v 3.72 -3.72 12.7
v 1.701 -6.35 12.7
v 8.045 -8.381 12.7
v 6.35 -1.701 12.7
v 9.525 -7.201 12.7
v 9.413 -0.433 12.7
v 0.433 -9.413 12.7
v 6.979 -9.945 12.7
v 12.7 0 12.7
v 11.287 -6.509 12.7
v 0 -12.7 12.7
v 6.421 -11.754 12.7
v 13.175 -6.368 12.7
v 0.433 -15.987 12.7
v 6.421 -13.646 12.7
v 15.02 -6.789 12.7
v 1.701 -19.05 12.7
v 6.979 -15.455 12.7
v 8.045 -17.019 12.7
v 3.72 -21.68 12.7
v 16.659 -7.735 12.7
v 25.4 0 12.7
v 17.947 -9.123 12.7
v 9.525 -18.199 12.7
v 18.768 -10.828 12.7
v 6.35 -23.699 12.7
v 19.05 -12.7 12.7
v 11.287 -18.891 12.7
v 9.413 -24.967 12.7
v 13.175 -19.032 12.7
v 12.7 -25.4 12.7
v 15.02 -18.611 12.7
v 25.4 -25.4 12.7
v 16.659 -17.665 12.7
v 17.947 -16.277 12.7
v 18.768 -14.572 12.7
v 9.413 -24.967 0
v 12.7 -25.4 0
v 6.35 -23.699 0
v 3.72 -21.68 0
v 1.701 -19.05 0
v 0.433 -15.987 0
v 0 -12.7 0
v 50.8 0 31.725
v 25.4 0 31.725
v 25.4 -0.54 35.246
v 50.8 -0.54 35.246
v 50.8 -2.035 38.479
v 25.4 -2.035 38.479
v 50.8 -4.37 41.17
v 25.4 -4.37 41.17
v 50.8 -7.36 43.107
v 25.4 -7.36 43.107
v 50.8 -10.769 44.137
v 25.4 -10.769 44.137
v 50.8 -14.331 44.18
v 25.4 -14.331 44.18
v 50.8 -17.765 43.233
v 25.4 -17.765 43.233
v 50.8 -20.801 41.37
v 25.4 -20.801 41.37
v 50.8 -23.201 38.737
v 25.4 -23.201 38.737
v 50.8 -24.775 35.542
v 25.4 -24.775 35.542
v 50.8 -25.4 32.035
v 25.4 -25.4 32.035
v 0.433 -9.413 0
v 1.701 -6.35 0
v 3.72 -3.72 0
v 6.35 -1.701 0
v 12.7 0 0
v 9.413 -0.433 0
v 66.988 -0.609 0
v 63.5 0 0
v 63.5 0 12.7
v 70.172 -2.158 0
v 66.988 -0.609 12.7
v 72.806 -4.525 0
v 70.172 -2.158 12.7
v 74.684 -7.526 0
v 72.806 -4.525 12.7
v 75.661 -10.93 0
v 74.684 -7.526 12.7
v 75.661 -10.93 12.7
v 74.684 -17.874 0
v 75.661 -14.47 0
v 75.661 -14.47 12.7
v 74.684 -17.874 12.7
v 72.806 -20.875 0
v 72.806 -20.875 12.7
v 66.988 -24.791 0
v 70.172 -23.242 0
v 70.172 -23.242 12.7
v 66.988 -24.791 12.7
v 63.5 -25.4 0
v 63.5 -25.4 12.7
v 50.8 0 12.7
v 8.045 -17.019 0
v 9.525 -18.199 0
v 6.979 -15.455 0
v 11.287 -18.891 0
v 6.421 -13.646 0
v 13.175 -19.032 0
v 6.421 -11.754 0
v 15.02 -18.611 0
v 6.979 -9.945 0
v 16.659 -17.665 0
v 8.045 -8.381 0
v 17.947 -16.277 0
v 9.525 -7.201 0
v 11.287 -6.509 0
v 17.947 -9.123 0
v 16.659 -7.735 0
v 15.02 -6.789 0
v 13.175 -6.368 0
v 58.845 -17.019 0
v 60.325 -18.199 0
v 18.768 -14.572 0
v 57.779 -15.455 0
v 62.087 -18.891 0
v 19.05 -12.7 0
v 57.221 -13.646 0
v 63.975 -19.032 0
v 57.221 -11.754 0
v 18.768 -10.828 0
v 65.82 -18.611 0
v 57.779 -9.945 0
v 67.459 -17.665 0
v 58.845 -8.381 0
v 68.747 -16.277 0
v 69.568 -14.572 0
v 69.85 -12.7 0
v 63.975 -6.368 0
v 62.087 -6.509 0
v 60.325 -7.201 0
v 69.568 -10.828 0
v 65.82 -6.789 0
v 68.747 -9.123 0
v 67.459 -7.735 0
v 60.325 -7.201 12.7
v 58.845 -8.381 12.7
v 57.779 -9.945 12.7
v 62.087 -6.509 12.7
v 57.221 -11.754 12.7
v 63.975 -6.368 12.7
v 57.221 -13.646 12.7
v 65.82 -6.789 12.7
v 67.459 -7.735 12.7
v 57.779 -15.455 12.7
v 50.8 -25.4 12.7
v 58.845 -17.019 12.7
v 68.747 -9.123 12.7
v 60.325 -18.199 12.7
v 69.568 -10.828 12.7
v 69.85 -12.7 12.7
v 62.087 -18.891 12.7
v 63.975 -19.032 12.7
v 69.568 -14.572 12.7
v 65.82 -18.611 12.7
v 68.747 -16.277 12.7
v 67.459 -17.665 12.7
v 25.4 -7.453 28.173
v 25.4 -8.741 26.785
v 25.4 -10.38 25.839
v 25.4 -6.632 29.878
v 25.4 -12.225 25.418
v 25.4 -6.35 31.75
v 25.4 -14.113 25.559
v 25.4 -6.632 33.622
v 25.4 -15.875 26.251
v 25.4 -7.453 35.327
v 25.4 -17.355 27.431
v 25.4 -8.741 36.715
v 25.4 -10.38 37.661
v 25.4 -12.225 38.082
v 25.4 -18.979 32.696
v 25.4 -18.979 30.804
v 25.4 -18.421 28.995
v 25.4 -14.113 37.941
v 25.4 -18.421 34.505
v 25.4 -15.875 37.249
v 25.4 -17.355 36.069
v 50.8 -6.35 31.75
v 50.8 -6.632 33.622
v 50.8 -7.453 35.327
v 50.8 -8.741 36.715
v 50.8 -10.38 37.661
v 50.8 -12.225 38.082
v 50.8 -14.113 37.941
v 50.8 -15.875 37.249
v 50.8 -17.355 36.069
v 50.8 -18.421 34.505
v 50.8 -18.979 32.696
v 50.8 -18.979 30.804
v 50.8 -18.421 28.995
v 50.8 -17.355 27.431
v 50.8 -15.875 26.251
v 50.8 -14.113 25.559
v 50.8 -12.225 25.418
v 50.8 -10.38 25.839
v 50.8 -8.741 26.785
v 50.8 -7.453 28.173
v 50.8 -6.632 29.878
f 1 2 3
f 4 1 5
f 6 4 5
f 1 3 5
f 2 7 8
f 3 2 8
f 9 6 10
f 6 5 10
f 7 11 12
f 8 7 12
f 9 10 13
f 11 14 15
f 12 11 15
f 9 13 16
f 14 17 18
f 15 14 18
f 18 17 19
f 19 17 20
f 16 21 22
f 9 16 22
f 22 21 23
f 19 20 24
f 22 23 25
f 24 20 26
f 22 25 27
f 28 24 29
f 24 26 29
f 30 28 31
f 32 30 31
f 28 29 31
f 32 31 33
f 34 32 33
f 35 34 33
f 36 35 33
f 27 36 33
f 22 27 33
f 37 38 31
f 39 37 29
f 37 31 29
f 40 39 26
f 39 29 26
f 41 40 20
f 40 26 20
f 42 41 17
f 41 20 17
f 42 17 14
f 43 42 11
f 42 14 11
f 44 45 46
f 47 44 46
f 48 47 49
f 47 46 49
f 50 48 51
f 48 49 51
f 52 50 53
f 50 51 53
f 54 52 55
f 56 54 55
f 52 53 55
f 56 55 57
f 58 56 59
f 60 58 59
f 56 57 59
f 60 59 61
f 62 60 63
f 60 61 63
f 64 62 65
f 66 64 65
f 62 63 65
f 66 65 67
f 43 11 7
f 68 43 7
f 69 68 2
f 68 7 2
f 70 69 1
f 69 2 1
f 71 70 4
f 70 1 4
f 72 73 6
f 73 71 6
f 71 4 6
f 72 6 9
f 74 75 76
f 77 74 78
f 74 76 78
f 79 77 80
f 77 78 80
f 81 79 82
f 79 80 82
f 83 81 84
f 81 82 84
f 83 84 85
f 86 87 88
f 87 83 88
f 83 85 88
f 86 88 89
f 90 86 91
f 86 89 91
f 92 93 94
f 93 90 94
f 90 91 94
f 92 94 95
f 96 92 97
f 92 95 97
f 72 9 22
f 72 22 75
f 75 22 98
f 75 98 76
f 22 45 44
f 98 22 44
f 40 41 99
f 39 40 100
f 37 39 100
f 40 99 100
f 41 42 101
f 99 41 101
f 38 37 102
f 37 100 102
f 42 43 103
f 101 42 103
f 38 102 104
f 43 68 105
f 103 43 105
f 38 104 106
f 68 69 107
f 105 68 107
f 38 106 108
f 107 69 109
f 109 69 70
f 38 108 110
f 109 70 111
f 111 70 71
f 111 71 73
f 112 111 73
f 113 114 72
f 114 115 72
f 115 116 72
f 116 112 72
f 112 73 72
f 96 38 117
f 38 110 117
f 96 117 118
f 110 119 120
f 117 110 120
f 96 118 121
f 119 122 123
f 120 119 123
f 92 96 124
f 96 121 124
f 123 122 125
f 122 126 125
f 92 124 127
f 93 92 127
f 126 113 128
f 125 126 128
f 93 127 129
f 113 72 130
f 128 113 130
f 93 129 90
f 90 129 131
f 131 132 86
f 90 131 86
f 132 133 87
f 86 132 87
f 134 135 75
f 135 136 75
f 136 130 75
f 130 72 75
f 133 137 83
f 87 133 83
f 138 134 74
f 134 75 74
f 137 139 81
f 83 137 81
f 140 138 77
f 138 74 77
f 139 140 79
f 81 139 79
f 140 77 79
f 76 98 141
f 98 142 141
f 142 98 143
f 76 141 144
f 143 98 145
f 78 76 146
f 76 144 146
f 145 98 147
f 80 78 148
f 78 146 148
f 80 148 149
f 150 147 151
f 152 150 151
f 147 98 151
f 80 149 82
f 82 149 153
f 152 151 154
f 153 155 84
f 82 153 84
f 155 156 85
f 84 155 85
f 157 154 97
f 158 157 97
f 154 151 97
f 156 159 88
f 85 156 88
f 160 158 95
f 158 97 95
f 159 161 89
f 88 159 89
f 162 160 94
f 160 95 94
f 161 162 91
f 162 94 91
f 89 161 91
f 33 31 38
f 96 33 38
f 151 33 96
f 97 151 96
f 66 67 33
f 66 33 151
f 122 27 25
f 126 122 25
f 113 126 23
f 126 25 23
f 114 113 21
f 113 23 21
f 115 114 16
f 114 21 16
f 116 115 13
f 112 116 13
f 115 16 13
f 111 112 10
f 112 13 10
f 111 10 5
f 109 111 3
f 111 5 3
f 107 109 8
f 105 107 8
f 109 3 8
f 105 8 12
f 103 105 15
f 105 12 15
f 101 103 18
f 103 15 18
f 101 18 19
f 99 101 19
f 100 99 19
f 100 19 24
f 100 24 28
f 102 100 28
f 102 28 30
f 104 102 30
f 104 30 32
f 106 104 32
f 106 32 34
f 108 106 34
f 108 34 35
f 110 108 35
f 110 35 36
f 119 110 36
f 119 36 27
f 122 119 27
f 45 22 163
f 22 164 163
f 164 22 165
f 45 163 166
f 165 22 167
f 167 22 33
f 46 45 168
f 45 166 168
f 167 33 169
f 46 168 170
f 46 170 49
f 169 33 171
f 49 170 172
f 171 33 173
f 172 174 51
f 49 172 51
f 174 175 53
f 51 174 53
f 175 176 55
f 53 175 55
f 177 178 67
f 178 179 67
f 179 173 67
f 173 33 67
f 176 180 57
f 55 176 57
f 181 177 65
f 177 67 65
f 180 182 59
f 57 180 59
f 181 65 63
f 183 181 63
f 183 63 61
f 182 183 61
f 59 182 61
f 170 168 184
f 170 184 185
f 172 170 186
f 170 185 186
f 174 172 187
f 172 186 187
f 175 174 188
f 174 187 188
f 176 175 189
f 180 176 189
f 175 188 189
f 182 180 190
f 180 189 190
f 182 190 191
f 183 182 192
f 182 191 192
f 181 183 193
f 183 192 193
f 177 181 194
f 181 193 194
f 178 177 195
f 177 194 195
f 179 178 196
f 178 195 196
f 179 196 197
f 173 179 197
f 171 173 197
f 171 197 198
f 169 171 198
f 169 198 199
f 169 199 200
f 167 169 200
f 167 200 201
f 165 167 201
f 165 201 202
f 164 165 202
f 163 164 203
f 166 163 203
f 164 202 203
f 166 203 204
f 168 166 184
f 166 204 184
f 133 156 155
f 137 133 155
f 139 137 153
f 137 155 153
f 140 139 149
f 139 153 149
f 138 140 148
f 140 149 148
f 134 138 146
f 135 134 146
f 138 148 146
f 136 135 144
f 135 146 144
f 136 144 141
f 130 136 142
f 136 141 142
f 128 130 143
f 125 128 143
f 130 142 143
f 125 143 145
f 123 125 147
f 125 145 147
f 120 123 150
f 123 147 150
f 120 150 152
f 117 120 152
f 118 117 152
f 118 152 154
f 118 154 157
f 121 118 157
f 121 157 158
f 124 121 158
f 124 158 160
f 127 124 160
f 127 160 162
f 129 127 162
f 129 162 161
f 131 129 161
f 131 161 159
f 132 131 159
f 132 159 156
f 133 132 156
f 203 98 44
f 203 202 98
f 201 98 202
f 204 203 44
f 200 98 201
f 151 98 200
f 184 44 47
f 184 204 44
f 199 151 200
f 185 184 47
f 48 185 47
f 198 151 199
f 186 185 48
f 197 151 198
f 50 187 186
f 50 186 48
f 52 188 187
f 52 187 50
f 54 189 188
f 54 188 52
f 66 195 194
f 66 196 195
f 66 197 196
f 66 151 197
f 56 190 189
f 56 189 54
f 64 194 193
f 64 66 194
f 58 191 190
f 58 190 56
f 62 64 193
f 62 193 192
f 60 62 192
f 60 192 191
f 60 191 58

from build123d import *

# Parameters (mm, degrees)
F0_W      = 76.2
F0_H      = 44.45
F1_DEPTH  = 25.4
F2_W      = 25.4
F2_H      = 31.75
F3_DEPTH  = 25.4
F4_R      = 6.35
F5_DEPTH  = 25.4
F6_R      = 6.35
F7_DEPTH  = 25.4
F9_DEPTH  = 25.4
F11_DEPTH = 25.4
F13_DEPTH = 25.4


with BuildPart() as f1:
    # F0 (on Front) → F1 (new body)
    with BuildSketch(Plane.XZ):
        with Locations((38.1, 22.225)):
            Rectangle(F0_W, F0_H)
    extrude(amount=F1_DEPTH)

    # F2 (on face) → F3 (cut)
    with BuildSketch(Plane.XZ.offset(25.4)):
        with Locations((12.7, 28.575)):
            Rectangle(F2_W, F2_H)
        with Locations((63.5, 28.575)):
            Rectangle(F2_W, F2_H)
    extrude(amount=-F3_DEPTH, mode=Mode.SUBTRACT)

    # F4 (on face) → F5 (cut)
    with BuildSketch(Plane.YZ.offset(50.8)):
        with Locations((-12.7, 31.75)):
            Circle(F4_R)
    extrude(amount=-F5_DEPTH, mode=Mode.SUBTRACT)

    # F6 (on face) → F7 (cut)
    with BuildSketch(Plane.XY.offset(12.7)):
        with Locations((12.7, -12.7)):
            Circle(F6_R)
        with Locations((63.5, -12.7)):
            Circle(F6_R)
    extrude(amount=-F7_DEPTH, mode=Mode.SUBTRACT)

    # F8 (on face) → F9 (cut)
    with BuildSketch(Plane.XY.offset(12.7)):
        with BuildLine():
            ThreePointArc((0, -12.7), (3.7197438789, -3.7197438789), (12.7, 0))
            Line((12.7, 0), (0, 0))
            Line((0, 0), (0, -12.7))
        make_face()
        with BuildLine():
            ThreePointArc((12.7, -25.4), (3.7197438789, -21.6802561211), (0, -12.7))
            Line((0, -12.7), (0, -25.4))
            Line((0, -25.4), (12.7, -25.4))
        make_face()
    extrude(amount=-F9_DEPTH, mode=Mode.SUBTRACT)

    # F10 (on face) → F11 (cut)
    with BuildSketch(Plane.XY.offset(12.7)):
        with BuildLine():
            ThreePointArc((63.5, 0), (75.7852064607, -12.7), (63.5, -25.4))
            Line((63.5, -25.4), (76.2, -25.4))
            Line((76.2, -25.4), (76.2, 0))
            Line((76.2, 0), (63.5, 0))
        make_face()
    extrude(amount=-F11_DEPTH, mode=Mode.SUBTRACT)

    # F12 (on face) → F13 (cut)
    with BuildSketch(Plane(origin=(25.4, 0, 0), x_dir=(0, -1, 0), z_dir=(-1, 0, 0))):
        with BuildLine():
            ThreePointArc((0, 31.7254364491), (12.5488484963, 44.2842424577), (25.4, 32.0349521935))
            Line((25.4, 32.0349521935), (25.4, 44.45))
            Line((25.4, 44.45), (0, 44.45))
            Line((0, 44.45), (0, 31.7254364491))
        make_face()
    extrude(amount=-F13_DEPTH, mode=Mode.SUBTRACT)


solid = f1.part
